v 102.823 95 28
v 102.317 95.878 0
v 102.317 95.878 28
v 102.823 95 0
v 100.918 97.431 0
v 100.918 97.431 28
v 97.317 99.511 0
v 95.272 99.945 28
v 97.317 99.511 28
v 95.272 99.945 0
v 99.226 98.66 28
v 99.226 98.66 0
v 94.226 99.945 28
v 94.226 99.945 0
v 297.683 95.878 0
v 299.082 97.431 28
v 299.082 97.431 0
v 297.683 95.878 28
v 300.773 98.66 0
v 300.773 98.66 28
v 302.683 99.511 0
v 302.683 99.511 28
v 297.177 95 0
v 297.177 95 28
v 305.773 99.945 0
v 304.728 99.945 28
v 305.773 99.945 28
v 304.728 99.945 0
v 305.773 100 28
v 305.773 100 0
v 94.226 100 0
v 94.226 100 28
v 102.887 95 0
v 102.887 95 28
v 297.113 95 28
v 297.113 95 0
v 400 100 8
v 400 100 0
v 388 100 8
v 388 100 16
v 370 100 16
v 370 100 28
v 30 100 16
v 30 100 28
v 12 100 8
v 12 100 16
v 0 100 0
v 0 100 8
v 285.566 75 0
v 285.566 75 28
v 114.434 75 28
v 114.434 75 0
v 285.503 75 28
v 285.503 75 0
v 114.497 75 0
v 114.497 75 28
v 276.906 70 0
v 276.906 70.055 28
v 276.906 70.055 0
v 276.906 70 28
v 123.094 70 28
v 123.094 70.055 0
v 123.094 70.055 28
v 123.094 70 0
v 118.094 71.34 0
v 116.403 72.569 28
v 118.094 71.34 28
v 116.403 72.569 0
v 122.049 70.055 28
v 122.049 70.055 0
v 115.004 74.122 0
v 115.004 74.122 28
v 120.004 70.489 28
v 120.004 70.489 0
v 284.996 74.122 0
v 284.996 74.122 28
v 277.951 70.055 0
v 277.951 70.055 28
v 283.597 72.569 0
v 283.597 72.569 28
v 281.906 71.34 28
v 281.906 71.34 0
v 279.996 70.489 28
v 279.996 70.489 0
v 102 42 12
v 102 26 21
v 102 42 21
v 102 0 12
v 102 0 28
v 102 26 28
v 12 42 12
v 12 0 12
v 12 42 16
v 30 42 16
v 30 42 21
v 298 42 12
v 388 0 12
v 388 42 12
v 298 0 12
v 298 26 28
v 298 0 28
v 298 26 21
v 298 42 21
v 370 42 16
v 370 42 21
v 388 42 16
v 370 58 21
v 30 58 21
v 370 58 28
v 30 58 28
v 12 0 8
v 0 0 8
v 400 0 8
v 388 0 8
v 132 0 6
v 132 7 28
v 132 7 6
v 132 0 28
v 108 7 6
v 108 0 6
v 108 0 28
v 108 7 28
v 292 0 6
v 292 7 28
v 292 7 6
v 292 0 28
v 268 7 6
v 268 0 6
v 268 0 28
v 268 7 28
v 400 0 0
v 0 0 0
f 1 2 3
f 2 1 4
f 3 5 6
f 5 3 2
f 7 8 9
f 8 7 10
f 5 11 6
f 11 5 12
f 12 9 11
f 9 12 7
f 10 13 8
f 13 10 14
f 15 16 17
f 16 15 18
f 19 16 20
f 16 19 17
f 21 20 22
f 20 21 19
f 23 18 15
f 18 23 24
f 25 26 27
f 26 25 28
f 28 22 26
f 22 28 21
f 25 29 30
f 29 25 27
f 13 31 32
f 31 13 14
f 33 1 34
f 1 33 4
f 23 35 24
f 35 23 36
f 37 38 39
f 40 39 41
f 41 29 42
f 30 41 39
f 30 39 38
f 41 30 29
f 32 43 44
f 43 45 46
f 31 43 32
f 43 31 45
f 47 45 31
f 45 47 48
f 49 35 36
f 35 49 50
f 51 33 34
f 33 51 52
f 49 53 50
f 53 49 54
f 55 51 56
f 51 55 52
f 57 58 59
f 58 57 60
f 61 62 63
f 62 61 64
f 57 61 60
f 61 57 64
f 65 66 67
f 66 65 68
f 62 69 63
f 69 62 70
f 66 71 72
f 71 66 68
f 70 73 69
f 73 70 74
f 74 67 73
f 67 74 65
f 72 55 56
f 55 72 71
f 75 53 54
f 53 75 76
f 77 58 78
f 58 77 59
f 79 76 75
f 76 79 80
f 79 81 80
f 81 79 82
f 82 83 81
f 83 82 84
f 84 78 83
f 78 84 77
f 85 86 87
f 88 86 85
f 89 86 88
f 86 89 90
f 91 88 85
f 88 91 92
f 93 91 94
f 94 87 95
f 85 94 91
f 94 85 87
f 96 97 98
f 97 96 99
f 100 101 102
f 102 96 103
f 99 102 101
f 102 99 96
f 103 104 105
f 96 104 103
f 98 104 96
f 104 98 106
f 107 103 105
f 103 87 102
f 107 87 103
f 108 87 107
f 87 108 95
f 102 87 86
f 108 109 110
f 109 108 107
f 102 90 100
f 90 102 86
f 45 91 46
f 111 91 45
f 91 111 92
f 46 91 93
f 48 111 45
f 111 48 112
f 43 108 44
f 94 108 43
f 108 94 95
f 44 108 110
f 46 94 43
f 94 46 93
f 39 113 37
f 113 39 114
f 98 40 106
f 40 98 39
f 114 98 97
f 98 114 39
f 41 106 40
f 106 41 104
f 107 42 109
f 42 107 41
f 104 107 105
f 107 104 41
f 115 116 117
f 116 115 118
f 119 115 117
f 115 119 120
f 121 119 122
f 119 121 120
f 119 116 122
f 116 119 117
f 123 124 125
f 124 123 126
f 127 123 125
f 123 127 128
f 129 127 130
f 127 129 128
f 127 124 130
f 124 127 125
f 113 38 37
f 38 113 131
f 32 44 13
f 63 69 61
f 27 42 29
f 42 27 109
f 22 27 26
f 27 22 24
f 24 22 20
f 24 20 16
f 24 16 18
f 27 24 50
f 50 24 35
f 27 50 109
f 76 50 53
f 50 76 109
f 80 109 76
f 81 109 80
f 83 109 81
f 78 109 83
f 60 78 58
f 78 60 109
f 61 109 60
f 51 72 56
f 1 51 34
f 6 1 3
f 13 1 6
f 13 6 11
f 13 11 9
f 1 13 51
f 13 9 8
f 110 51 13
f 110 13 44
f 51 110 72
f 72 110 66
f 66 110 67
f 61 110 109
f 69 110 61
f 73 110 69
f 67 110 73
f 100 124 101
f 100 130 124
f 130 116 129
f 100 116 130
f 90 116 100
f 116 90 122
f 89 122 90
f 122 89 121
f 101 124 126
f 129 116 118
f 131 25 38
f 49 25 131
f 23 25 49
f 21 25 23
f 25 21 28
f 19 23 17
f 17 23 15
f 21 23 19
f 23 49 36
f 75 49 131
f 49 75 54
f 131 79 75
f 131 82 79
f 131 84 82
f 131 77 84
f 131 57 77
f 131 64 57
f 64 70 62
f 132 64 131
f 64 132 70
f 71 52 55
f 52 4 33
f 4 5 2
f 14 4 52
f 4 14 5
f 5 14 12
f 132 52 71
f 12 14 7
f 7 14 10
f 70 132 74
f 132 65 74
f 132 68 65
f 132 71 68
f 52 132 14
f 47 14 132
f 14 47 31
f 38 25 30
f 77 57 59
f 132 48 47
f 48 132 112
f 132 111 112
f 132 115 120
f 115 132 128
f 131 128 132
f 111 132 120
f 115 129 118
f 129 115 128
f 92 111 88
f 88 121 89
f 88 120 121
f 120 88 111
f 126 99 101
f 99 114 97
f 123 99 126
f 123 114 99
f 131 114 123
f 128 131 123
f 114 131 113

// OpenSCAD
include <../src/wardrobe.scad>;
plank_xz_front_bottom(wardrobe_n);
//github_openscad -o wardrobe_3/plank_xz_front_bottom.stl -D wardrobe_n=3 -D cutting_edge=0 -D break_view_length=0 wardrobe_3/plank_xz_front_bottom_stl.scad
